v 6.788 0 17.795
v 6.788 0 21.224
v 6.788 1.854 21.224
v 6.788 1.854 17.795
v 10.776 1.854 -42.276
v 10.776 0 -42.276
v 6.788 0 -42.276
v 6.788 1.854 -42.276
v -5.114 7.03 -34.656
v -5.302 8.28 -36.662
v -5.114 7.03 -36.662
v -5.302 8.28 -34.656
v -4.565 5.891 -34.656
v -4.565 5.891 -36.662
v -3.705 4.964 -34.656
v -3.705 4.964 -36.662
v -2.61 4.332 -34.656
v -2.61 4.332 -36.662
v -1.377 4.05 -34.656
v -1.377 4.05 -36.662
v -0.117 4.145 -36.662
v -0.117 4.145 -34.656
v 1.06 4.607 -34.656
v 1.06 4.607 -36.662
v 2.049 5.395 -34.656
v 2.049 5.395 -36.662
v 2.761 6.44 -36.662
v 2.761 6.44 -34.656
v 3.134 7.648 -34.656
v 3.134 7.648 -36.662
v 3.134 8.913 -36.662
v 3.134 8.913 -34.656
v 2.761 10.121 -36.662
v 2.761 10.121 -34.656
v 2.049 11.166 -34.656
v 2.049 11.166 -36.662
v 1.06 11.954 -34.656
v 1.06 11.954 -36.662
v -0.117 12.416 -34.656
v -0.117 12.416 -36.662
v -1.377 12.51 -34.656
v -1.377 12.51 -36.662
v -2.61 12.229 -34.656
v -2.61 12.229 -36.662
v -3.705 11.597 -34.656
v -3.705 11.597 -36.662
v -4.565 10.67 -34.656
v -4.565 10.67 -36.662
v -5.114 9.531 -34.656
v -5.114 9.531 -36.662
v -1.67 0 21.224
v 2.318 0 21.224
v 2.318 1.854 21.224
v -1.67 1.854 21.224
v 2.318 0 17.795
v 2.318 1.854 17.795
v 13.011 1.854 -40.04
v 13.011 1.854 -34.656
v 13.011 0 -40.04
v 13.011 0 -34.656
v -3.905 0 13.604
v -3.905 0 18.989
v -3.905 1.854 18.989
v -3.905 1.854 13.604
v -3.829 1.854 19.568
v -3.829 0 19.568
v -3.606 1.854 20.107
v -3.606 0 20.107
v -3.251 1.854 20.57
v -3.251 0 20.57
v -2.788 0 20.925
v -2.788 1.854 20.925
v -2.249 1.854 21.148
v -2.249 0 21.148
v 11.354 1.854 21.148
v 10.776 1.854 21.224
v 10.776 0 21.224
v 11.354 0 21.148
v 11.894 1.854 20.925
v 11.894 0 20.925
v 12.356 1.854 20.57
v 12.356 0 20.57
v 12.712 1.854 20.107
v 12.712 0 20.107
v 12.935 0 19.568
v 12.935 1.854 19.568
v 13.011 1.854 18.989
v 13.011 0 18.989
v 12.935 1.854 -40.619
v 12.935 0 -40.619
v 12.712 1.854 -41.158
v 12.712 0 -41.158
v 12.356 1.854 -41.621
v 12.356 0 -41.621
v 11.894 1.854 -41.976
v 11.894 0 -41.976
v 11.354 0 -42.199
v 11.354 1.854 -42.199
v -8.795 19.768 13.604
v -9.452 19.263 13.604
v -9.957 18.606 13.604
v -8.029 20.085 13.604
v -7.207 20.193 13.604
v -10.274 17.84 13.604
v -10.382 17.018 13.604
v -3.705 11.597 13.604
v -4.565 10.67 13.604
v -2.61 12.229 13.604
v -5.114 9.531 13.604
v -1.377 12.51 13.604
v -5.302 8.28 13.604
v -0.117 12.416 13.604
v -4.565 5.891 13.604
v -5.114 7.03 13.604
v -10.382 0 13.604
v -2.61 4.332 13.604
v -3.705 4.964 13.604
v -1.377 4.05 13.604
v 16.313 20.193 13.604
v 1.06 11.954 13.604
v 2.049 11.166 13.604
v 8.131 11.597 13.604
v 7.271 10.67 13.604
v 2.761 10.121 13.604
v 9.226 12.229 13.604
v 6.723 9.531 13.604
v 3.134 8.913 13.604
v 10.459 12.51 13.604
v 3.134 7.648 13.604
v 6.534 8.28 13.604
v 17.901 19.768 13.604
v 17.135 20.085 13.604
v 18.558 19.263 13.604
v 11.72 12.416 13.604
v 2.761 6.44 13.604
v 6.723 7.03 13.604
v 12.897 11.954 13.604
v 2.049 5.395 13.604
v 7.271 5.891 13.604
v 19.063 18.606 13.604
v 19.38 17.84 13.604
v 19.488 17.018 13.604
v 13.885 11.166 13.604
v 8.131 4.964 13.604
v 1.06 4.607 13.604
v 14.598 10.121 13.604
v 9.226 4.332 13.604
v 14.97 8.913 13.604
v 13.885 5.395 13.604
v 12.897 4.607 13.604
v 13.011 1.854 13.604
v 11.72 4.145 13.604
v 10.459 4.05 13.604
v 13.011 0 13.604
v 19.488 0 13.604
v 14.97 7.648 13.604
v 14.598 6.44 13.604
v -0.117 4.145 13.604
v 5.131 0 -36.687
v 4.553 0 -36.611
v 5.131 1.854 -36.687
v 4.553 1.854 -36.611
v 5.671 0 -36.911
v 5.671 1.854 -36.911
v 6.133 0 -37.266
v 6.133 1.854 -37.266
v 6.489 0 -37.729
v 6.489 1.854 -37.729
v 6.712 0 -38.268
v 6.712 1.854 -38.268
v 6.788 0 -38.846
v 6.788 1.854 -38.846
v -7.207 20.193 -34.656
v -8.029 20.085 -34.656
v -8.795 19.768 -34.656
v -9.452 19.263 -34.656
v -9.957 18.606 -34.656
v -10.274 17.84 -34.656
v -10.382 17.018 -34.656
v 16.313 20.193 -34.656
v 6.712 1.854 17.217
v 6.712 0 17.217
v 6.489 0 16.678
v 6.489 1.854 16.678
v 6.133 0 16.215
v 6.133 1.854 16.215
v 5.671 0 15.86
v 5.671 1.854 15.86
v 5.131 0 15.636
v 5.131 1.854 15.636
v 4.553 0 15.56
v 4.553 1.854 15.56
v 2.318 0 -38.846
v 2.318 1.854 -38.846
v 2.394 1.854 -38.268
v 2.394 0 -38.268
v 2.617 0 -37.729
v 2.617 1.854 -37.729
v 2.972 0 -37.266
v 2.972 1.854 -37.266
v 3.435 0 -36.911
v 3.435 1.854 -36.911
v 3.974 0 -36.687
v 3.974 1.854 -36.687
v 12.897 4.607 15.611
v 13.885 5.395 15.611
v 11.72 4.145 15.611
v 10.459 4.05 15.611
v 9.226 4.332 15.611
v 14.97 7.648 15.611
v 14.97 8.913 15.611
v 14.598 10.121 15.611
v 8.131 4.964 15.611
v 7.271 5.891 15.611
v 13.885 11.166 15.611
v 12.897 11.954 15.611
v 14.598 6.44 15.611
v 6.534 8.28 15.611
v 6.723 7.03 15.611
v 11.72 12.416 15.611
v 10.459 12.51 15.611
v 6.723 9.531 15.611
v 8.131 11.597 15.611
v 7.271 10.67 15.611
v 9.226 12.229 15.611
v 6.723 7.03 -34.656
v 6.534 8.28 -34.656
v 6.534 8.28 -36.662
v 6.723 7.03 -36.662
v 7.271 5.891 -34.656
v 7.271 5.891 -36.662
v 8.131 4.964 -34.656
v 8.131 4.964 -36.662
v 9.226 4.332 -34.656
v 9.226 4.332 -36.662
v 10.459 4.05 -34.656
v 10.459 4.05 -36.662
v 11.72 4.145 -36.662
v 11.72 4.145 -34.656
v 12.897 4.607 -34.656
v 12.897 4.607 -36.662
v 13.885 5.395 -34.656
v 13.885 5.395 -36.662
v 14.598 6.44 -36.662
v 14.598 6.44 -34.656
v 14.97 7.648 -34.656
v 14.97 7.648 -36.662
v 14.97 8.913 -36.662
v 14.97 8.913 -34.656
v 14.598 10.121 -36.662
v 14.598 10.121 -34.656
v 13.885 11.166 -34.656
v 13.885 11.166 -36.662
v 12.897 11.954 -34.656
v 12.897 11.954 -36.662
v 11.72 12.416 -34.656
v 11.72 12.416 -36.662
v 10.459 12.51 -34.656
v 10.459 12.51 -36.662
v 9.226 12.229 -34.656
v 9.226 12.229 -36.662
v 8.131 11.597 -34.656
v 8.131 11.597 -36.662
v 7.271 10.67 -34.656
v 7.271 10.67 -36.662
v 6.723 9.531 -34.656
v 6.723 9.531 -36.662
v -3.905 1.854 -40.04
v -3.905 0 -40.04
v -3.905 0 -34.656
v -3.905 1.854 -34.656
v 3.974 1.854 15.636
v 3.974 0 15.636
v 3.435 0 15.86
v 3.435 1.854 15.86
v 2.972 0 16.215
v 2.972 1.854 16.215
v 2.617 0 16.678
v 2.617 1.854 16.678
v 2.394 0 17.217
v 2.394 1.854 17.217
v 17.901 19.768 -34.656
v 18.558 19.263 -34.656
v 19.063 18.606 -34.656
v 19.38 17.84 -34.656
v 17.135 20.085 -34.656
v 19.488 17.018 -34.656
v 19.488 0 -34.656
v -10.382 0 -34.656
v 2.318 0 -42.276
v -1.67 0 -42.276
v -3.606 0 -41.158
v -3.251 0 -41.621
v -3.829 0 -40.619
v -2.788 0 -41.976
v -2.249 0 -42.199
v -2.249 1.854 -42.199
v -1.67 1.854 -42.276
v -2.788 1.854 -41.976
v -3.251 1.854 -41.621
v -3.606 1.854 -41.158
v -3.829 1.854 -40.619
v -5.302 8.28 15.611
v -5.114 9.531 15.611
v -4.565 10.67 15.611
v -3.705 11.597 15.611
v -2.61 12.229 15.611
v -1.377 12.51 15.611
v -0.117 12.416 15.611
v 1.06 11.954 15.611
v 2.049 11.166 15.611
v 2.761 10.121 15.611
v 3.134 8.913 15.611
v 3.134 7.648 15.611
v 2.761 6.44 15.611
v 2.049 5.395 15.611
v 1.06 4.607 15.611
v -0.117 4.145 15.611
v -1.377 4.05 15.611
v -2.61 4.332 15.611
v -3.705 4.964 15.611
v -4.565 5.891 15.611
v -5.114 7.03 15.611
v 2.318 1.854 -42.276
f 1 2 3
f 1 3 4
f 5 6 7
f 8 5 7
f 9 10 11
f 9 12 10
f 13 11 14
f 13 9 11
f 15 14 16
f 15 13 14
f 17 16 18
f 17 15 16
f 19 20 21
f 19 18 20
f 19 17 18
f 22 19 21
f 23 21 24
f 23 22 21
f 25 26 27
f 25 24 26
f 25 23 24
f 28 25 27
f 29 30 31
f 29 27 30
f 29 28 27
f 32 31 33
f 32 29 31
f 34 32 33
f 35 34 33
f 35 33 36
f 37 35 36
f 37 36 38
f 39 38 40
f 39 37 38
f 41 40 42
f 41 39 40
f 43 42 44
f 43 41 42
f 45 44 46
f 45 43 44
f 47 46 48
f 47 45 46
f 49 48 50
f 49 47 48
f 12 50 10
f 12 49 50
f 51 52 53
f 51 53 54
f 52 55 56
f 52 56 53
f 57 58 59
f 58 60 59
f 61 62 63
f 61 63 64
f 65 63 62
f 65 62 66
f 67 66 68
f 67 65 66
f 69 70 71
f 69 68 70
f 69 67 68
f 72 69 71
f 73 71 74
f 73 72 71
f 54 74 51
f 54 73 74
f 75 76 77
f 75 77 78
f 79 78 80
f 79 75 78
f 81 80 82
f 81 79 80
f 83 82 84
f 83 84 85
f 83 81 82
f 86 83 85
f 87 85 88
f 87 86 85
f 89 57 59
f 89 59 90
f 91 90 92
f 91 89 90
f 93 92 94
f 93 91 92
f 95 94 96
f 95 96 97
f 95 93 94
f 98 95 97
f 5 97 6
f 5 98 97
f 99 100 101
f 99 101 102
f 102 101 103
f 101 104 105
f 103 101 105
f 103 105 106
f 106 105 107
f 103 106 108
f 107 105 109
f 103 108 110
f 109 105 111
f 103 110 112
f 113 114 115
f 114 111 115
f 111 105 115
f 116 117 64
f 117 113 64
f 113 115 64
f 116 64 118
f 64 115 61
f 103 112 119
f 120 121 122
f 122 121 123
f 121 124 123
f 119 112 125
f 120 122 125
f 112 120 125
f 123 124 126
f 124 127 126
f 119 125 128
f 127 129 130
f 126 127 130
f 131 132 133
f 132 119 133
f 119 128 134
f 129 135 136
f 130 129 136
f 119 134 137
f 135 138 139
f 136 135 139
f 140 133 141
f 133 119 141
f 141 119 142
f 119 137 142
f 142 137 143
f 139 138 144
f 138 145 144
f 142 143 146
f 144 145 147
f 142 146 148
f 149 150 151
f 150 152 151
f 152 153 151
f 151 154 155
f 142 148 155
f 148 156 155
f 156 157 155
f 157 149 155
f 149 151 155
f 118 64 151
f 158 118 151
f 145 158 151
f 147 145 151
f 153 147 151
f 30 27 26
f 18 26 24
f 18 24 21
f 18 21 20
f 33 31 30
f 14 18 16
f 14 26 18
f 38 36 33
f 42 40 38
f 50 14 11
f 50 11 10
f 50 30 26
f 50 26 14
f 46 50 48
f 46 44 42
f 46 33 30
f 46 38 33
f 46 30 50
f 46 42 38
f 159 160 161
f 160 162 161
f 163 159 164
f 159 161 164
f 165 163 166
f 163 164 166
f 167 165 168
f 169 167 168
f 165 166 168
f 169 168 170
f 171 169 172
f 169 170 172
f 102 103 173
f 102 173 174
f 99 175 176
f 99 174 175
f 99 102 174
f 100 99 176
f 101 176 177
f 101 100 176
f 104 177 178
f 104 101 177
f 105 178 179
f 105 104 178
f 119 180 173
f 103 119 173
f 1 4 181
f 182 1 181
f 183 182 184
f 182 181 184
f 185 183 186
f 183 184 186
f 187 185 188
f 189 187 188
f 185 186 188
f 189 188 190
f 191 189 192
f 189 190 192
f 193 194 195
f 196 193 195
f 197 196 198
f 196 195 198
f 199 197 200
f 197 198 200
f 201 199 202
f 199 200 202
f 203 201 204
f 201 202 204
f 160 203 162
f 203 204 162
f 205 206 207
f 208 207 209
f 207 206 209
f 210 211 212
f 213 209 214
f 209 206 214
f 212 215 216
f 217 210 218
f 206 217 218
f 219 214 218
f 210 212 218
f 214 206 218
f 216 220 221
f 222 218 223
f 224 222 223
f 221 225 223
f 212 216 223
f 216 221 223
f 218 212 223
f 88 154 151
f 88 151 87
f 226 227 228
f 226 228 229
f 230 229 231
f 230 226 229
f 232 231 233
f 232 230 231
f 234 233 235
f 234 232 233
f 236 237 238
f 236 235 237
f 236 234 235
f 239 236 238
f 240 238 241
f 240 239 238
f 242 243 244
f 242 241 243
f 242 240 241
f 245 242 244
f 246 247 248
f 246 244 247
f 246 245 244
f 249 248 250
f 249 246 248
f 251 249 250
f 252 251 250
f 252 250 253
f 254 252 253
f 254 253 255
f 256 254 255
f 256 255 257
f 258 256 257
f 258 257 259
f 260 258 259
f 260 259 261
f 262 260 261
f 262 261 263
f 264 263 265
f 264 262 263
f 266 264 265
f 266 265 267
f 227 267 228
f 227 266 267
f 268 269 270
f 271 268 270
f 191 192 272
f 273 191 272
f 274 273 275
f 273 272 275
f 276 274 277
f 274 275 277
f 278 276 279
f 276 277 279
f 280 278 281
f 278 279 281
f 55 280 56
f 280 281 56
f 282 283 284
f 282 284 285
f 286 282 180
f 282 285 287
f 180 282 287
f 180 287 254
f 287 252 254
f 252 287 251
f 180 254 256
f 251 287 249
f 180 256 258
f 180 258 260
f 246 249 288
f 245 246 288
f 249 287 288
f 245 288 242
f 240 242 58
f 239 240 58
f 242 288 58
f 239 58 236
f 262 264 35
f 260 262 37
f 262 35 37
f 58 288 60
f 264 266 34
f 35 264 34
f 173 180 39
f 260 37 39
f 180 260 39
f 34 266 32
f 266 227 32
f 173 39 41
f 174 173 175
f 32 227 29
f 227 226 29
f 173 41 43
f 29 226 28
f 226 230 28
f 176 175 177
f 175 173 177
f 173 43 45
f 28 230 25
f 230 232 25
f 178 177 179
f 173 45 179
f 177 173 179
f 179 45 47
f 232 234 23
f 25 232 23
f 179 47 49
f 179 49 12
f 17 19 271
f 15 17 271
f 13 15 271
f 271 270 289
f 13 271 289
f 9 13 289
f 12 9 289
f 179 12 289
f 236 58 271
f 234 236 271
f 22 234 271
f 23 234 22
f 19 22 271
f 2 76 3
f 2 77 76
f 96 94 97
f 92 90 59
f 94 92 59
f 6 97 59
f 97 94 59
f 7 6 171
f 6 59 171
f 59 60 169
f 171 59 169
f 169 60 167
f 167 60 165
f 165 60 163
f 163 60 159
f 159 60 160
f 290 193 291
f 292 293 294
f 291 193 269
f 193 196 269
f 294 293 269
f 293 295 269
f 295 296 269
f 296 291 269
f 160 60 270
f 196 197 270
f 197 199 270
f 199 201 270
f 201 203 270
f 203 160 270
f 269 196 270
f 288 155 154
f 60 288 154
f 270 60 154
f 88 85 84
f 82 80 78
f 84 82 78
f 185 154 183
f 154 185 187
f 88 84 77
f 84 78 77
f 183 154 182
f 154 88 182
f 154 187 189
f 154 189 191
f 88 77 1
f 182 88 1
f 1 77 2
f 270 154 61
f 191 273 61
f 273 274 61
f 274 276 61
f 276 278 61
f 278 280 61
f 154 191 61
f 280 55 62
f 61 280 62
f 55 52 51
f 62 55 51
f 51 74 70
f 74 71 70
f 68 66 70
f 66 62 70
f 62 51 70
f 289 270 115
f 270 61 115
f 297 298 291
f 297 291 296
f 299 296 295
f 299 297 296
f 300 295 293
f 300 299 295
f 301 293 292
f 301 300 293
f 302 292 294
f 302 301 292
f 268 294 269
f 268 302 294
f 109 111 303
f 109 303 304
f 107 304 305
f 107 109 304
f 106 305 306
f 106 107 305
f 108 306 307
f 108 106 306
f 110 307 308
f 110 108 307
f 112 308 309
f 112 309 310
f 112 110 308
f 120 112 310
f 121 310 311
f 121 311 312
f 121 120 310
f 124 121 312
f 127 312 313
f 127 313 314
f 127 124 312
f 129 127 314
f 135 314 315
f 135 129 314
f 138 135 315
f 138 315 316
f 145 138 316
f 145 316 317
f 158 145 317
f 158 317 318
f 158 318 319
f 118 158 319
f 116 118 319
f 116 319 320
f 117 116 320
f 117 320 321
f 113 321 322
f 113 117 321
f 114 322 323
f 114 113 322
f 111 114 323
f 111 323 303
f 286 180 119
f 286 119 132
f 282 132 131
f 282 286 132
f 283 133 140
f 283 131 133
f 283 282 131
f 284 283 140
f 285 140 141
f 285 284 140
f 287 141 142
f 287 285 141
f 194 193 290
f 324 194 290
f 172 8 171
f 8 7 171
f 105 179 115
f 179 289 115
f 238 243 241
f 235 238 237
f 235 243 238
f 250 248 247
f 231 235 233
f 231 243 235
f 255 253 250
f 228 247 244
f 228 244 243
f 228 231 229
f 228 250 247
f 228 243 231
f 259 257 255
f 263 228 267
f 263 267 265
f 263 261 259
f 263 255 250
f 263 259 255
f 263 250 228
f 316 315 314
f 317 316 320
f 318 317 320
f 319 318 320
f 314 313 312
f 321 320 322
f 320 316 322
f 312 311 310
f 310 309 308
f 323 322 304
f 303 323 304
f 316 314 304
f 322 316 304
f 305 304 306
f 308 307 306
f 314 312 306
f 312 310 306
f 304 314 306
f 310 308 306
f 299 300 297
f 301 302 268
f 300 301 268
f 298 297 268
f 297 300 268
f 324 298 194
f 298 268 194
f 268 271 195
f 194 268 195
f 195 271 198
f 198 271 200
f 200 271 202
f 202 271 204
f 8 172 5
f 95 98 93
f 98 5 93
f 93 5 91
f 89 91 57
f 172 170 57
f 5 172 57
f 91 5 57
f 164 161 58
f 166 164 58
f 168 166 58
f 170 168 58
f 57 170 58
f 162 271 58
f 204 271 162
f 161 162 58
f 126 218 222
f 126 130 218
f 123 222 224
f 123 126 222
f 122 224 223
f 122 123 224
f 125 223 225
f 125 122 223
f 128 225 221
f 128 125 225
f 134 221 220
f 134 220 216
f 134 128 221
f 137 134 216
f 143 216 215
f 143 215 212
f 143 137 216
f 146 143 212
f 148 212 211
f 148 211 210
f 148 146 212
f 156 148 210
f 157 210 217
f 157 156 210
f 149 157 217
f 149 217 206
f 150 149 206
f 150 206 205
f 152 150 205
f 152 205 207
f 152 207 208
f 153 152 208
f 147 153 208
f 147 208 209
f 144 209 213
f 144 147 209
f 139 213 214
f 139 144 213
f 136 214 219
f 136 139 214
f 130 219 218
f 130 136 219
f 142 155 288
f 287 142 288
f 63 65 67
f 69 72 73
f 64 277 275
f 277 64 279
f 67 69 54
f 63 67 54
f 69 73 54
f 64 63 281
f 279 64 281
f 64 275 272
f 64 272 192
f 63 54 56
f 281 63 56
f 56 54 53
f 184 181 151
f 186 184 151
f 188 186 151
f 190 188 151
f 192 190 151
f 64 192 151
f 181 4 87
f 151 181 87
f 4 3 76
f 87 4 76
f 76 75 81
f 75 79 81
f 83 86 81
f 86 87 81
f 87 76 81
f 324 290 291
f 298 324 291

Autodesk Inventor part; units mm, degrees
ref_plane "YZ Plane" through (0, 0, 0) normal (1, 0, 0) x (0, 1, 0)
ref_plane "XZ Plane" through (0, 0, 0) normal (0, 1, 0) x (-1, 0, 0)
ref_plane "XY Plane" through (0, 0, 0) normal (0, 0, 1) x (1, 0, 0)
sketch "Sketch1" plane through (0, 0, 0) normal (0, 1, 0) x (-1, 0, 0)
  line L0 (10.3823, 13.6045) -> (-19.4881, 13.6045)
  line L1 (-19.4881, 13.6045) -> (-19.4881, -34.6555)
  line L2 (-19.4881, -34.6555) -> (10.3823, -34.6555)
  line L3 (10.3823, -34.6555) -> (10.3823, 13.6045)
  point P0 (0, 0)
  dimension "d0" = 48.26
  dimension "d1" = 29.8704
extrude "Extrusion1" add sketch "Sketch1" along normal blind 20.193
fillet "Fillet1" radius 3.175 2 edges at (19.4881, 20.193, -10.5255) (-10.3823, 20.193, -10.5255)
sketch "Sketch2" plane through (0, 0, 0) normal (0, -1, 0) x (1, 0, 0)
  line L0 (13.0111, -34.6555) -> (13.0111, -42.2755)
  line L1 (19.4881, 13.6045) -> (19.4881, -34.6555) projected
  line L2 (13.0111, -42.2755) -> (6.7881, -42.2755)
  line L3 (6.7881, -42.2755) -> (6.7881, -34.6555)
  line L4 (6.7881, -36.6113) -> (2.3177, -36.6113)
  line L5 (2.3177, -34.6555) -> (2.3177, -42.2755)
  line L6 (2.3177, -42.2755) -> (-3.9053, -42.2755)
  line L7 (-3.9053, -42.2755) -> (-3.9053, -34.6555)
  line L8 (-10.3823, -34.6555) -> (-10.3823, 13.6045) projected
  line L9 (19.4881, -10.5255) -> (-10.3823, -10.5255) construction
  line L10 (13.0111, 13.6045) -> (13.0111, 21.2245)
  line L11 (13.0111, 21.2245) -> (6.7881, 21.2245)
  line L12 (6.7881, 21.2245) -> (6.7881, 13.6045)
  line L13 (6.7881, 15.5603) -> (2.3177, 15.5603)
  line L14 (2.3177, 13.6045) -> (2.3177, 21.2245)
  line L15 (2.3177, 21.2245) -> (-3.9053, 21.2245)
  line L16 (-3.9053, 21.2245) -> (-3.9053, 13.6045)
  line L17 (13.0111, -34.6555) -> (6.7881, -34.6555)
  line L18 (2.3177, -34.6555) -> (-3.9053, -34.6555)
  line L19 (19.4881, -34.6555) -> (-10.3823, -34.6555) projected
  line L20 (6.7881, -34.6555) -> (2.3177, -34.6555)
  line L21 (13.0111, 13.6045) -> (6.7881, 13.6045)
  line L22 (-10.3823, 13.6045) -> (19.4881, 13.6045) projected
  line L23 (6.7881, 13.6045) -> (2.3177, 13.6045)
  line L24 (2.1667, 13.6045) -> (-3.9053, 13.6045)
  line L25 (6.7881, 13.6045) -> (2.3177, 13.6045)
  line L26 (2.3177, 13.6045) -> (2.3177, 15.5603)
  line L27 (2.3177, 15.5603) -> (6.7881, 15.5603)
  line L28 (6.7881, 15.5603) -> (6.7881, 13.6045)
  line L29 (6.7881, -36.6113) -> (2.3177, -36.6113)
  line L30 (2.3177, -36.6113) -> (2.3177, -34.6555)
  line L31 (2.3177, -34.6555) -> (6.7881, -34.6555)
  line L32 (6.7881, -34.6555) -> (6.7881, -36.6113)
  line L33 (-3.9053, 13.6045) -> (2.3177, 13.6045)
  line L34 (2.3177, 13.6045) -> (2.3177, 21.2245)
  line L35 (2.3177, 21.2245) -> (-3.9053, 21.2245)
  line L36 (-3.9053, 21.2245) -> (-3.9053, 13.6045)
  point P0 (0, 0)
  dimension "d5" = 6.477
  dimension "d6" = 7.62
  dimension "d7" = 6.223
  dimension "d9" = 4.4704
  dimension "d10" = 6.223
  dimension "d11" = 7.62
  dimension "d12" = 29.8704
  dimension "d13" = 4.4704
  dimension "d15" = 6.477
  dimension "d16" = 6.477
  dimension "d17" = 6.477
extrude "Extrusion2" add sketch "Sketch2" against normal blind 1.8542 contours L0 L2 L3 L17 | L3 L4 L5 L19 | L5 L6 L7 L18 | L21 L12 L11 L10 | L22 L14 L13 L12 | L22 L16 L15 L14
fillet "Fillet2" radius 2.2352 4 edges at (6.7881, 0.9271, 15.5603) (2.3177, 0.9271, 15.5603) (6.7881, 0.9271, -36.6113) (2.3177, 0.9271, -36.6113)
fillet "Fillet3" radius 2.2352 4 edges at (-3.9053, 0.9271, -42.2755) (13.0111, 0.9271, -42.2755) (13.0111, 0.9271, 21.2245) (-3.9053, 0.9271, 21.2245)
sketch "Sketch3" plane through (16.3131, 20.193, -34.6555) normal (0, 0, -1) x (-1, 0, 0)
  circle A0 centre (5.5372, -11.9126) radius 4.2418
  circle A1 centre (17.3736, -11.9126) radius 4.2418
  line L0 (20.2184, -20.193) -> (26.6954, -20.193) projected
  line L1 (-3.175, -20.193) -> (3.302, -20.193) projected
  line L2 (-3.175, -20.193) -> (-3.175, -3.175) projected
  line L3 (26.6954, -20.193) -> (26.6954, -3.175) projected
  point P0 (16.3131, -20.193)
  dimension "d22" = 8.4836
  dimension "d23" = 8.4836
  dimension "d24" = 8.2804
  dimension "d25" = 8.2804
  dimension "d26" = 11.8364
  dimension "d27" = 4.4704
  dimension "d28" = 5.08
extrude "Extrusion3" add sketch "Sketch3" along normal blind 2.0066 and the other way blind 50.2666
equation "\"d10\" = d7"
equation "\"d11\" = d6"
equation "\"d13\" = d9"
equation "\"d23\" = d22"
equation "\"d25\" = d24"
properties part number "LED Driver"
